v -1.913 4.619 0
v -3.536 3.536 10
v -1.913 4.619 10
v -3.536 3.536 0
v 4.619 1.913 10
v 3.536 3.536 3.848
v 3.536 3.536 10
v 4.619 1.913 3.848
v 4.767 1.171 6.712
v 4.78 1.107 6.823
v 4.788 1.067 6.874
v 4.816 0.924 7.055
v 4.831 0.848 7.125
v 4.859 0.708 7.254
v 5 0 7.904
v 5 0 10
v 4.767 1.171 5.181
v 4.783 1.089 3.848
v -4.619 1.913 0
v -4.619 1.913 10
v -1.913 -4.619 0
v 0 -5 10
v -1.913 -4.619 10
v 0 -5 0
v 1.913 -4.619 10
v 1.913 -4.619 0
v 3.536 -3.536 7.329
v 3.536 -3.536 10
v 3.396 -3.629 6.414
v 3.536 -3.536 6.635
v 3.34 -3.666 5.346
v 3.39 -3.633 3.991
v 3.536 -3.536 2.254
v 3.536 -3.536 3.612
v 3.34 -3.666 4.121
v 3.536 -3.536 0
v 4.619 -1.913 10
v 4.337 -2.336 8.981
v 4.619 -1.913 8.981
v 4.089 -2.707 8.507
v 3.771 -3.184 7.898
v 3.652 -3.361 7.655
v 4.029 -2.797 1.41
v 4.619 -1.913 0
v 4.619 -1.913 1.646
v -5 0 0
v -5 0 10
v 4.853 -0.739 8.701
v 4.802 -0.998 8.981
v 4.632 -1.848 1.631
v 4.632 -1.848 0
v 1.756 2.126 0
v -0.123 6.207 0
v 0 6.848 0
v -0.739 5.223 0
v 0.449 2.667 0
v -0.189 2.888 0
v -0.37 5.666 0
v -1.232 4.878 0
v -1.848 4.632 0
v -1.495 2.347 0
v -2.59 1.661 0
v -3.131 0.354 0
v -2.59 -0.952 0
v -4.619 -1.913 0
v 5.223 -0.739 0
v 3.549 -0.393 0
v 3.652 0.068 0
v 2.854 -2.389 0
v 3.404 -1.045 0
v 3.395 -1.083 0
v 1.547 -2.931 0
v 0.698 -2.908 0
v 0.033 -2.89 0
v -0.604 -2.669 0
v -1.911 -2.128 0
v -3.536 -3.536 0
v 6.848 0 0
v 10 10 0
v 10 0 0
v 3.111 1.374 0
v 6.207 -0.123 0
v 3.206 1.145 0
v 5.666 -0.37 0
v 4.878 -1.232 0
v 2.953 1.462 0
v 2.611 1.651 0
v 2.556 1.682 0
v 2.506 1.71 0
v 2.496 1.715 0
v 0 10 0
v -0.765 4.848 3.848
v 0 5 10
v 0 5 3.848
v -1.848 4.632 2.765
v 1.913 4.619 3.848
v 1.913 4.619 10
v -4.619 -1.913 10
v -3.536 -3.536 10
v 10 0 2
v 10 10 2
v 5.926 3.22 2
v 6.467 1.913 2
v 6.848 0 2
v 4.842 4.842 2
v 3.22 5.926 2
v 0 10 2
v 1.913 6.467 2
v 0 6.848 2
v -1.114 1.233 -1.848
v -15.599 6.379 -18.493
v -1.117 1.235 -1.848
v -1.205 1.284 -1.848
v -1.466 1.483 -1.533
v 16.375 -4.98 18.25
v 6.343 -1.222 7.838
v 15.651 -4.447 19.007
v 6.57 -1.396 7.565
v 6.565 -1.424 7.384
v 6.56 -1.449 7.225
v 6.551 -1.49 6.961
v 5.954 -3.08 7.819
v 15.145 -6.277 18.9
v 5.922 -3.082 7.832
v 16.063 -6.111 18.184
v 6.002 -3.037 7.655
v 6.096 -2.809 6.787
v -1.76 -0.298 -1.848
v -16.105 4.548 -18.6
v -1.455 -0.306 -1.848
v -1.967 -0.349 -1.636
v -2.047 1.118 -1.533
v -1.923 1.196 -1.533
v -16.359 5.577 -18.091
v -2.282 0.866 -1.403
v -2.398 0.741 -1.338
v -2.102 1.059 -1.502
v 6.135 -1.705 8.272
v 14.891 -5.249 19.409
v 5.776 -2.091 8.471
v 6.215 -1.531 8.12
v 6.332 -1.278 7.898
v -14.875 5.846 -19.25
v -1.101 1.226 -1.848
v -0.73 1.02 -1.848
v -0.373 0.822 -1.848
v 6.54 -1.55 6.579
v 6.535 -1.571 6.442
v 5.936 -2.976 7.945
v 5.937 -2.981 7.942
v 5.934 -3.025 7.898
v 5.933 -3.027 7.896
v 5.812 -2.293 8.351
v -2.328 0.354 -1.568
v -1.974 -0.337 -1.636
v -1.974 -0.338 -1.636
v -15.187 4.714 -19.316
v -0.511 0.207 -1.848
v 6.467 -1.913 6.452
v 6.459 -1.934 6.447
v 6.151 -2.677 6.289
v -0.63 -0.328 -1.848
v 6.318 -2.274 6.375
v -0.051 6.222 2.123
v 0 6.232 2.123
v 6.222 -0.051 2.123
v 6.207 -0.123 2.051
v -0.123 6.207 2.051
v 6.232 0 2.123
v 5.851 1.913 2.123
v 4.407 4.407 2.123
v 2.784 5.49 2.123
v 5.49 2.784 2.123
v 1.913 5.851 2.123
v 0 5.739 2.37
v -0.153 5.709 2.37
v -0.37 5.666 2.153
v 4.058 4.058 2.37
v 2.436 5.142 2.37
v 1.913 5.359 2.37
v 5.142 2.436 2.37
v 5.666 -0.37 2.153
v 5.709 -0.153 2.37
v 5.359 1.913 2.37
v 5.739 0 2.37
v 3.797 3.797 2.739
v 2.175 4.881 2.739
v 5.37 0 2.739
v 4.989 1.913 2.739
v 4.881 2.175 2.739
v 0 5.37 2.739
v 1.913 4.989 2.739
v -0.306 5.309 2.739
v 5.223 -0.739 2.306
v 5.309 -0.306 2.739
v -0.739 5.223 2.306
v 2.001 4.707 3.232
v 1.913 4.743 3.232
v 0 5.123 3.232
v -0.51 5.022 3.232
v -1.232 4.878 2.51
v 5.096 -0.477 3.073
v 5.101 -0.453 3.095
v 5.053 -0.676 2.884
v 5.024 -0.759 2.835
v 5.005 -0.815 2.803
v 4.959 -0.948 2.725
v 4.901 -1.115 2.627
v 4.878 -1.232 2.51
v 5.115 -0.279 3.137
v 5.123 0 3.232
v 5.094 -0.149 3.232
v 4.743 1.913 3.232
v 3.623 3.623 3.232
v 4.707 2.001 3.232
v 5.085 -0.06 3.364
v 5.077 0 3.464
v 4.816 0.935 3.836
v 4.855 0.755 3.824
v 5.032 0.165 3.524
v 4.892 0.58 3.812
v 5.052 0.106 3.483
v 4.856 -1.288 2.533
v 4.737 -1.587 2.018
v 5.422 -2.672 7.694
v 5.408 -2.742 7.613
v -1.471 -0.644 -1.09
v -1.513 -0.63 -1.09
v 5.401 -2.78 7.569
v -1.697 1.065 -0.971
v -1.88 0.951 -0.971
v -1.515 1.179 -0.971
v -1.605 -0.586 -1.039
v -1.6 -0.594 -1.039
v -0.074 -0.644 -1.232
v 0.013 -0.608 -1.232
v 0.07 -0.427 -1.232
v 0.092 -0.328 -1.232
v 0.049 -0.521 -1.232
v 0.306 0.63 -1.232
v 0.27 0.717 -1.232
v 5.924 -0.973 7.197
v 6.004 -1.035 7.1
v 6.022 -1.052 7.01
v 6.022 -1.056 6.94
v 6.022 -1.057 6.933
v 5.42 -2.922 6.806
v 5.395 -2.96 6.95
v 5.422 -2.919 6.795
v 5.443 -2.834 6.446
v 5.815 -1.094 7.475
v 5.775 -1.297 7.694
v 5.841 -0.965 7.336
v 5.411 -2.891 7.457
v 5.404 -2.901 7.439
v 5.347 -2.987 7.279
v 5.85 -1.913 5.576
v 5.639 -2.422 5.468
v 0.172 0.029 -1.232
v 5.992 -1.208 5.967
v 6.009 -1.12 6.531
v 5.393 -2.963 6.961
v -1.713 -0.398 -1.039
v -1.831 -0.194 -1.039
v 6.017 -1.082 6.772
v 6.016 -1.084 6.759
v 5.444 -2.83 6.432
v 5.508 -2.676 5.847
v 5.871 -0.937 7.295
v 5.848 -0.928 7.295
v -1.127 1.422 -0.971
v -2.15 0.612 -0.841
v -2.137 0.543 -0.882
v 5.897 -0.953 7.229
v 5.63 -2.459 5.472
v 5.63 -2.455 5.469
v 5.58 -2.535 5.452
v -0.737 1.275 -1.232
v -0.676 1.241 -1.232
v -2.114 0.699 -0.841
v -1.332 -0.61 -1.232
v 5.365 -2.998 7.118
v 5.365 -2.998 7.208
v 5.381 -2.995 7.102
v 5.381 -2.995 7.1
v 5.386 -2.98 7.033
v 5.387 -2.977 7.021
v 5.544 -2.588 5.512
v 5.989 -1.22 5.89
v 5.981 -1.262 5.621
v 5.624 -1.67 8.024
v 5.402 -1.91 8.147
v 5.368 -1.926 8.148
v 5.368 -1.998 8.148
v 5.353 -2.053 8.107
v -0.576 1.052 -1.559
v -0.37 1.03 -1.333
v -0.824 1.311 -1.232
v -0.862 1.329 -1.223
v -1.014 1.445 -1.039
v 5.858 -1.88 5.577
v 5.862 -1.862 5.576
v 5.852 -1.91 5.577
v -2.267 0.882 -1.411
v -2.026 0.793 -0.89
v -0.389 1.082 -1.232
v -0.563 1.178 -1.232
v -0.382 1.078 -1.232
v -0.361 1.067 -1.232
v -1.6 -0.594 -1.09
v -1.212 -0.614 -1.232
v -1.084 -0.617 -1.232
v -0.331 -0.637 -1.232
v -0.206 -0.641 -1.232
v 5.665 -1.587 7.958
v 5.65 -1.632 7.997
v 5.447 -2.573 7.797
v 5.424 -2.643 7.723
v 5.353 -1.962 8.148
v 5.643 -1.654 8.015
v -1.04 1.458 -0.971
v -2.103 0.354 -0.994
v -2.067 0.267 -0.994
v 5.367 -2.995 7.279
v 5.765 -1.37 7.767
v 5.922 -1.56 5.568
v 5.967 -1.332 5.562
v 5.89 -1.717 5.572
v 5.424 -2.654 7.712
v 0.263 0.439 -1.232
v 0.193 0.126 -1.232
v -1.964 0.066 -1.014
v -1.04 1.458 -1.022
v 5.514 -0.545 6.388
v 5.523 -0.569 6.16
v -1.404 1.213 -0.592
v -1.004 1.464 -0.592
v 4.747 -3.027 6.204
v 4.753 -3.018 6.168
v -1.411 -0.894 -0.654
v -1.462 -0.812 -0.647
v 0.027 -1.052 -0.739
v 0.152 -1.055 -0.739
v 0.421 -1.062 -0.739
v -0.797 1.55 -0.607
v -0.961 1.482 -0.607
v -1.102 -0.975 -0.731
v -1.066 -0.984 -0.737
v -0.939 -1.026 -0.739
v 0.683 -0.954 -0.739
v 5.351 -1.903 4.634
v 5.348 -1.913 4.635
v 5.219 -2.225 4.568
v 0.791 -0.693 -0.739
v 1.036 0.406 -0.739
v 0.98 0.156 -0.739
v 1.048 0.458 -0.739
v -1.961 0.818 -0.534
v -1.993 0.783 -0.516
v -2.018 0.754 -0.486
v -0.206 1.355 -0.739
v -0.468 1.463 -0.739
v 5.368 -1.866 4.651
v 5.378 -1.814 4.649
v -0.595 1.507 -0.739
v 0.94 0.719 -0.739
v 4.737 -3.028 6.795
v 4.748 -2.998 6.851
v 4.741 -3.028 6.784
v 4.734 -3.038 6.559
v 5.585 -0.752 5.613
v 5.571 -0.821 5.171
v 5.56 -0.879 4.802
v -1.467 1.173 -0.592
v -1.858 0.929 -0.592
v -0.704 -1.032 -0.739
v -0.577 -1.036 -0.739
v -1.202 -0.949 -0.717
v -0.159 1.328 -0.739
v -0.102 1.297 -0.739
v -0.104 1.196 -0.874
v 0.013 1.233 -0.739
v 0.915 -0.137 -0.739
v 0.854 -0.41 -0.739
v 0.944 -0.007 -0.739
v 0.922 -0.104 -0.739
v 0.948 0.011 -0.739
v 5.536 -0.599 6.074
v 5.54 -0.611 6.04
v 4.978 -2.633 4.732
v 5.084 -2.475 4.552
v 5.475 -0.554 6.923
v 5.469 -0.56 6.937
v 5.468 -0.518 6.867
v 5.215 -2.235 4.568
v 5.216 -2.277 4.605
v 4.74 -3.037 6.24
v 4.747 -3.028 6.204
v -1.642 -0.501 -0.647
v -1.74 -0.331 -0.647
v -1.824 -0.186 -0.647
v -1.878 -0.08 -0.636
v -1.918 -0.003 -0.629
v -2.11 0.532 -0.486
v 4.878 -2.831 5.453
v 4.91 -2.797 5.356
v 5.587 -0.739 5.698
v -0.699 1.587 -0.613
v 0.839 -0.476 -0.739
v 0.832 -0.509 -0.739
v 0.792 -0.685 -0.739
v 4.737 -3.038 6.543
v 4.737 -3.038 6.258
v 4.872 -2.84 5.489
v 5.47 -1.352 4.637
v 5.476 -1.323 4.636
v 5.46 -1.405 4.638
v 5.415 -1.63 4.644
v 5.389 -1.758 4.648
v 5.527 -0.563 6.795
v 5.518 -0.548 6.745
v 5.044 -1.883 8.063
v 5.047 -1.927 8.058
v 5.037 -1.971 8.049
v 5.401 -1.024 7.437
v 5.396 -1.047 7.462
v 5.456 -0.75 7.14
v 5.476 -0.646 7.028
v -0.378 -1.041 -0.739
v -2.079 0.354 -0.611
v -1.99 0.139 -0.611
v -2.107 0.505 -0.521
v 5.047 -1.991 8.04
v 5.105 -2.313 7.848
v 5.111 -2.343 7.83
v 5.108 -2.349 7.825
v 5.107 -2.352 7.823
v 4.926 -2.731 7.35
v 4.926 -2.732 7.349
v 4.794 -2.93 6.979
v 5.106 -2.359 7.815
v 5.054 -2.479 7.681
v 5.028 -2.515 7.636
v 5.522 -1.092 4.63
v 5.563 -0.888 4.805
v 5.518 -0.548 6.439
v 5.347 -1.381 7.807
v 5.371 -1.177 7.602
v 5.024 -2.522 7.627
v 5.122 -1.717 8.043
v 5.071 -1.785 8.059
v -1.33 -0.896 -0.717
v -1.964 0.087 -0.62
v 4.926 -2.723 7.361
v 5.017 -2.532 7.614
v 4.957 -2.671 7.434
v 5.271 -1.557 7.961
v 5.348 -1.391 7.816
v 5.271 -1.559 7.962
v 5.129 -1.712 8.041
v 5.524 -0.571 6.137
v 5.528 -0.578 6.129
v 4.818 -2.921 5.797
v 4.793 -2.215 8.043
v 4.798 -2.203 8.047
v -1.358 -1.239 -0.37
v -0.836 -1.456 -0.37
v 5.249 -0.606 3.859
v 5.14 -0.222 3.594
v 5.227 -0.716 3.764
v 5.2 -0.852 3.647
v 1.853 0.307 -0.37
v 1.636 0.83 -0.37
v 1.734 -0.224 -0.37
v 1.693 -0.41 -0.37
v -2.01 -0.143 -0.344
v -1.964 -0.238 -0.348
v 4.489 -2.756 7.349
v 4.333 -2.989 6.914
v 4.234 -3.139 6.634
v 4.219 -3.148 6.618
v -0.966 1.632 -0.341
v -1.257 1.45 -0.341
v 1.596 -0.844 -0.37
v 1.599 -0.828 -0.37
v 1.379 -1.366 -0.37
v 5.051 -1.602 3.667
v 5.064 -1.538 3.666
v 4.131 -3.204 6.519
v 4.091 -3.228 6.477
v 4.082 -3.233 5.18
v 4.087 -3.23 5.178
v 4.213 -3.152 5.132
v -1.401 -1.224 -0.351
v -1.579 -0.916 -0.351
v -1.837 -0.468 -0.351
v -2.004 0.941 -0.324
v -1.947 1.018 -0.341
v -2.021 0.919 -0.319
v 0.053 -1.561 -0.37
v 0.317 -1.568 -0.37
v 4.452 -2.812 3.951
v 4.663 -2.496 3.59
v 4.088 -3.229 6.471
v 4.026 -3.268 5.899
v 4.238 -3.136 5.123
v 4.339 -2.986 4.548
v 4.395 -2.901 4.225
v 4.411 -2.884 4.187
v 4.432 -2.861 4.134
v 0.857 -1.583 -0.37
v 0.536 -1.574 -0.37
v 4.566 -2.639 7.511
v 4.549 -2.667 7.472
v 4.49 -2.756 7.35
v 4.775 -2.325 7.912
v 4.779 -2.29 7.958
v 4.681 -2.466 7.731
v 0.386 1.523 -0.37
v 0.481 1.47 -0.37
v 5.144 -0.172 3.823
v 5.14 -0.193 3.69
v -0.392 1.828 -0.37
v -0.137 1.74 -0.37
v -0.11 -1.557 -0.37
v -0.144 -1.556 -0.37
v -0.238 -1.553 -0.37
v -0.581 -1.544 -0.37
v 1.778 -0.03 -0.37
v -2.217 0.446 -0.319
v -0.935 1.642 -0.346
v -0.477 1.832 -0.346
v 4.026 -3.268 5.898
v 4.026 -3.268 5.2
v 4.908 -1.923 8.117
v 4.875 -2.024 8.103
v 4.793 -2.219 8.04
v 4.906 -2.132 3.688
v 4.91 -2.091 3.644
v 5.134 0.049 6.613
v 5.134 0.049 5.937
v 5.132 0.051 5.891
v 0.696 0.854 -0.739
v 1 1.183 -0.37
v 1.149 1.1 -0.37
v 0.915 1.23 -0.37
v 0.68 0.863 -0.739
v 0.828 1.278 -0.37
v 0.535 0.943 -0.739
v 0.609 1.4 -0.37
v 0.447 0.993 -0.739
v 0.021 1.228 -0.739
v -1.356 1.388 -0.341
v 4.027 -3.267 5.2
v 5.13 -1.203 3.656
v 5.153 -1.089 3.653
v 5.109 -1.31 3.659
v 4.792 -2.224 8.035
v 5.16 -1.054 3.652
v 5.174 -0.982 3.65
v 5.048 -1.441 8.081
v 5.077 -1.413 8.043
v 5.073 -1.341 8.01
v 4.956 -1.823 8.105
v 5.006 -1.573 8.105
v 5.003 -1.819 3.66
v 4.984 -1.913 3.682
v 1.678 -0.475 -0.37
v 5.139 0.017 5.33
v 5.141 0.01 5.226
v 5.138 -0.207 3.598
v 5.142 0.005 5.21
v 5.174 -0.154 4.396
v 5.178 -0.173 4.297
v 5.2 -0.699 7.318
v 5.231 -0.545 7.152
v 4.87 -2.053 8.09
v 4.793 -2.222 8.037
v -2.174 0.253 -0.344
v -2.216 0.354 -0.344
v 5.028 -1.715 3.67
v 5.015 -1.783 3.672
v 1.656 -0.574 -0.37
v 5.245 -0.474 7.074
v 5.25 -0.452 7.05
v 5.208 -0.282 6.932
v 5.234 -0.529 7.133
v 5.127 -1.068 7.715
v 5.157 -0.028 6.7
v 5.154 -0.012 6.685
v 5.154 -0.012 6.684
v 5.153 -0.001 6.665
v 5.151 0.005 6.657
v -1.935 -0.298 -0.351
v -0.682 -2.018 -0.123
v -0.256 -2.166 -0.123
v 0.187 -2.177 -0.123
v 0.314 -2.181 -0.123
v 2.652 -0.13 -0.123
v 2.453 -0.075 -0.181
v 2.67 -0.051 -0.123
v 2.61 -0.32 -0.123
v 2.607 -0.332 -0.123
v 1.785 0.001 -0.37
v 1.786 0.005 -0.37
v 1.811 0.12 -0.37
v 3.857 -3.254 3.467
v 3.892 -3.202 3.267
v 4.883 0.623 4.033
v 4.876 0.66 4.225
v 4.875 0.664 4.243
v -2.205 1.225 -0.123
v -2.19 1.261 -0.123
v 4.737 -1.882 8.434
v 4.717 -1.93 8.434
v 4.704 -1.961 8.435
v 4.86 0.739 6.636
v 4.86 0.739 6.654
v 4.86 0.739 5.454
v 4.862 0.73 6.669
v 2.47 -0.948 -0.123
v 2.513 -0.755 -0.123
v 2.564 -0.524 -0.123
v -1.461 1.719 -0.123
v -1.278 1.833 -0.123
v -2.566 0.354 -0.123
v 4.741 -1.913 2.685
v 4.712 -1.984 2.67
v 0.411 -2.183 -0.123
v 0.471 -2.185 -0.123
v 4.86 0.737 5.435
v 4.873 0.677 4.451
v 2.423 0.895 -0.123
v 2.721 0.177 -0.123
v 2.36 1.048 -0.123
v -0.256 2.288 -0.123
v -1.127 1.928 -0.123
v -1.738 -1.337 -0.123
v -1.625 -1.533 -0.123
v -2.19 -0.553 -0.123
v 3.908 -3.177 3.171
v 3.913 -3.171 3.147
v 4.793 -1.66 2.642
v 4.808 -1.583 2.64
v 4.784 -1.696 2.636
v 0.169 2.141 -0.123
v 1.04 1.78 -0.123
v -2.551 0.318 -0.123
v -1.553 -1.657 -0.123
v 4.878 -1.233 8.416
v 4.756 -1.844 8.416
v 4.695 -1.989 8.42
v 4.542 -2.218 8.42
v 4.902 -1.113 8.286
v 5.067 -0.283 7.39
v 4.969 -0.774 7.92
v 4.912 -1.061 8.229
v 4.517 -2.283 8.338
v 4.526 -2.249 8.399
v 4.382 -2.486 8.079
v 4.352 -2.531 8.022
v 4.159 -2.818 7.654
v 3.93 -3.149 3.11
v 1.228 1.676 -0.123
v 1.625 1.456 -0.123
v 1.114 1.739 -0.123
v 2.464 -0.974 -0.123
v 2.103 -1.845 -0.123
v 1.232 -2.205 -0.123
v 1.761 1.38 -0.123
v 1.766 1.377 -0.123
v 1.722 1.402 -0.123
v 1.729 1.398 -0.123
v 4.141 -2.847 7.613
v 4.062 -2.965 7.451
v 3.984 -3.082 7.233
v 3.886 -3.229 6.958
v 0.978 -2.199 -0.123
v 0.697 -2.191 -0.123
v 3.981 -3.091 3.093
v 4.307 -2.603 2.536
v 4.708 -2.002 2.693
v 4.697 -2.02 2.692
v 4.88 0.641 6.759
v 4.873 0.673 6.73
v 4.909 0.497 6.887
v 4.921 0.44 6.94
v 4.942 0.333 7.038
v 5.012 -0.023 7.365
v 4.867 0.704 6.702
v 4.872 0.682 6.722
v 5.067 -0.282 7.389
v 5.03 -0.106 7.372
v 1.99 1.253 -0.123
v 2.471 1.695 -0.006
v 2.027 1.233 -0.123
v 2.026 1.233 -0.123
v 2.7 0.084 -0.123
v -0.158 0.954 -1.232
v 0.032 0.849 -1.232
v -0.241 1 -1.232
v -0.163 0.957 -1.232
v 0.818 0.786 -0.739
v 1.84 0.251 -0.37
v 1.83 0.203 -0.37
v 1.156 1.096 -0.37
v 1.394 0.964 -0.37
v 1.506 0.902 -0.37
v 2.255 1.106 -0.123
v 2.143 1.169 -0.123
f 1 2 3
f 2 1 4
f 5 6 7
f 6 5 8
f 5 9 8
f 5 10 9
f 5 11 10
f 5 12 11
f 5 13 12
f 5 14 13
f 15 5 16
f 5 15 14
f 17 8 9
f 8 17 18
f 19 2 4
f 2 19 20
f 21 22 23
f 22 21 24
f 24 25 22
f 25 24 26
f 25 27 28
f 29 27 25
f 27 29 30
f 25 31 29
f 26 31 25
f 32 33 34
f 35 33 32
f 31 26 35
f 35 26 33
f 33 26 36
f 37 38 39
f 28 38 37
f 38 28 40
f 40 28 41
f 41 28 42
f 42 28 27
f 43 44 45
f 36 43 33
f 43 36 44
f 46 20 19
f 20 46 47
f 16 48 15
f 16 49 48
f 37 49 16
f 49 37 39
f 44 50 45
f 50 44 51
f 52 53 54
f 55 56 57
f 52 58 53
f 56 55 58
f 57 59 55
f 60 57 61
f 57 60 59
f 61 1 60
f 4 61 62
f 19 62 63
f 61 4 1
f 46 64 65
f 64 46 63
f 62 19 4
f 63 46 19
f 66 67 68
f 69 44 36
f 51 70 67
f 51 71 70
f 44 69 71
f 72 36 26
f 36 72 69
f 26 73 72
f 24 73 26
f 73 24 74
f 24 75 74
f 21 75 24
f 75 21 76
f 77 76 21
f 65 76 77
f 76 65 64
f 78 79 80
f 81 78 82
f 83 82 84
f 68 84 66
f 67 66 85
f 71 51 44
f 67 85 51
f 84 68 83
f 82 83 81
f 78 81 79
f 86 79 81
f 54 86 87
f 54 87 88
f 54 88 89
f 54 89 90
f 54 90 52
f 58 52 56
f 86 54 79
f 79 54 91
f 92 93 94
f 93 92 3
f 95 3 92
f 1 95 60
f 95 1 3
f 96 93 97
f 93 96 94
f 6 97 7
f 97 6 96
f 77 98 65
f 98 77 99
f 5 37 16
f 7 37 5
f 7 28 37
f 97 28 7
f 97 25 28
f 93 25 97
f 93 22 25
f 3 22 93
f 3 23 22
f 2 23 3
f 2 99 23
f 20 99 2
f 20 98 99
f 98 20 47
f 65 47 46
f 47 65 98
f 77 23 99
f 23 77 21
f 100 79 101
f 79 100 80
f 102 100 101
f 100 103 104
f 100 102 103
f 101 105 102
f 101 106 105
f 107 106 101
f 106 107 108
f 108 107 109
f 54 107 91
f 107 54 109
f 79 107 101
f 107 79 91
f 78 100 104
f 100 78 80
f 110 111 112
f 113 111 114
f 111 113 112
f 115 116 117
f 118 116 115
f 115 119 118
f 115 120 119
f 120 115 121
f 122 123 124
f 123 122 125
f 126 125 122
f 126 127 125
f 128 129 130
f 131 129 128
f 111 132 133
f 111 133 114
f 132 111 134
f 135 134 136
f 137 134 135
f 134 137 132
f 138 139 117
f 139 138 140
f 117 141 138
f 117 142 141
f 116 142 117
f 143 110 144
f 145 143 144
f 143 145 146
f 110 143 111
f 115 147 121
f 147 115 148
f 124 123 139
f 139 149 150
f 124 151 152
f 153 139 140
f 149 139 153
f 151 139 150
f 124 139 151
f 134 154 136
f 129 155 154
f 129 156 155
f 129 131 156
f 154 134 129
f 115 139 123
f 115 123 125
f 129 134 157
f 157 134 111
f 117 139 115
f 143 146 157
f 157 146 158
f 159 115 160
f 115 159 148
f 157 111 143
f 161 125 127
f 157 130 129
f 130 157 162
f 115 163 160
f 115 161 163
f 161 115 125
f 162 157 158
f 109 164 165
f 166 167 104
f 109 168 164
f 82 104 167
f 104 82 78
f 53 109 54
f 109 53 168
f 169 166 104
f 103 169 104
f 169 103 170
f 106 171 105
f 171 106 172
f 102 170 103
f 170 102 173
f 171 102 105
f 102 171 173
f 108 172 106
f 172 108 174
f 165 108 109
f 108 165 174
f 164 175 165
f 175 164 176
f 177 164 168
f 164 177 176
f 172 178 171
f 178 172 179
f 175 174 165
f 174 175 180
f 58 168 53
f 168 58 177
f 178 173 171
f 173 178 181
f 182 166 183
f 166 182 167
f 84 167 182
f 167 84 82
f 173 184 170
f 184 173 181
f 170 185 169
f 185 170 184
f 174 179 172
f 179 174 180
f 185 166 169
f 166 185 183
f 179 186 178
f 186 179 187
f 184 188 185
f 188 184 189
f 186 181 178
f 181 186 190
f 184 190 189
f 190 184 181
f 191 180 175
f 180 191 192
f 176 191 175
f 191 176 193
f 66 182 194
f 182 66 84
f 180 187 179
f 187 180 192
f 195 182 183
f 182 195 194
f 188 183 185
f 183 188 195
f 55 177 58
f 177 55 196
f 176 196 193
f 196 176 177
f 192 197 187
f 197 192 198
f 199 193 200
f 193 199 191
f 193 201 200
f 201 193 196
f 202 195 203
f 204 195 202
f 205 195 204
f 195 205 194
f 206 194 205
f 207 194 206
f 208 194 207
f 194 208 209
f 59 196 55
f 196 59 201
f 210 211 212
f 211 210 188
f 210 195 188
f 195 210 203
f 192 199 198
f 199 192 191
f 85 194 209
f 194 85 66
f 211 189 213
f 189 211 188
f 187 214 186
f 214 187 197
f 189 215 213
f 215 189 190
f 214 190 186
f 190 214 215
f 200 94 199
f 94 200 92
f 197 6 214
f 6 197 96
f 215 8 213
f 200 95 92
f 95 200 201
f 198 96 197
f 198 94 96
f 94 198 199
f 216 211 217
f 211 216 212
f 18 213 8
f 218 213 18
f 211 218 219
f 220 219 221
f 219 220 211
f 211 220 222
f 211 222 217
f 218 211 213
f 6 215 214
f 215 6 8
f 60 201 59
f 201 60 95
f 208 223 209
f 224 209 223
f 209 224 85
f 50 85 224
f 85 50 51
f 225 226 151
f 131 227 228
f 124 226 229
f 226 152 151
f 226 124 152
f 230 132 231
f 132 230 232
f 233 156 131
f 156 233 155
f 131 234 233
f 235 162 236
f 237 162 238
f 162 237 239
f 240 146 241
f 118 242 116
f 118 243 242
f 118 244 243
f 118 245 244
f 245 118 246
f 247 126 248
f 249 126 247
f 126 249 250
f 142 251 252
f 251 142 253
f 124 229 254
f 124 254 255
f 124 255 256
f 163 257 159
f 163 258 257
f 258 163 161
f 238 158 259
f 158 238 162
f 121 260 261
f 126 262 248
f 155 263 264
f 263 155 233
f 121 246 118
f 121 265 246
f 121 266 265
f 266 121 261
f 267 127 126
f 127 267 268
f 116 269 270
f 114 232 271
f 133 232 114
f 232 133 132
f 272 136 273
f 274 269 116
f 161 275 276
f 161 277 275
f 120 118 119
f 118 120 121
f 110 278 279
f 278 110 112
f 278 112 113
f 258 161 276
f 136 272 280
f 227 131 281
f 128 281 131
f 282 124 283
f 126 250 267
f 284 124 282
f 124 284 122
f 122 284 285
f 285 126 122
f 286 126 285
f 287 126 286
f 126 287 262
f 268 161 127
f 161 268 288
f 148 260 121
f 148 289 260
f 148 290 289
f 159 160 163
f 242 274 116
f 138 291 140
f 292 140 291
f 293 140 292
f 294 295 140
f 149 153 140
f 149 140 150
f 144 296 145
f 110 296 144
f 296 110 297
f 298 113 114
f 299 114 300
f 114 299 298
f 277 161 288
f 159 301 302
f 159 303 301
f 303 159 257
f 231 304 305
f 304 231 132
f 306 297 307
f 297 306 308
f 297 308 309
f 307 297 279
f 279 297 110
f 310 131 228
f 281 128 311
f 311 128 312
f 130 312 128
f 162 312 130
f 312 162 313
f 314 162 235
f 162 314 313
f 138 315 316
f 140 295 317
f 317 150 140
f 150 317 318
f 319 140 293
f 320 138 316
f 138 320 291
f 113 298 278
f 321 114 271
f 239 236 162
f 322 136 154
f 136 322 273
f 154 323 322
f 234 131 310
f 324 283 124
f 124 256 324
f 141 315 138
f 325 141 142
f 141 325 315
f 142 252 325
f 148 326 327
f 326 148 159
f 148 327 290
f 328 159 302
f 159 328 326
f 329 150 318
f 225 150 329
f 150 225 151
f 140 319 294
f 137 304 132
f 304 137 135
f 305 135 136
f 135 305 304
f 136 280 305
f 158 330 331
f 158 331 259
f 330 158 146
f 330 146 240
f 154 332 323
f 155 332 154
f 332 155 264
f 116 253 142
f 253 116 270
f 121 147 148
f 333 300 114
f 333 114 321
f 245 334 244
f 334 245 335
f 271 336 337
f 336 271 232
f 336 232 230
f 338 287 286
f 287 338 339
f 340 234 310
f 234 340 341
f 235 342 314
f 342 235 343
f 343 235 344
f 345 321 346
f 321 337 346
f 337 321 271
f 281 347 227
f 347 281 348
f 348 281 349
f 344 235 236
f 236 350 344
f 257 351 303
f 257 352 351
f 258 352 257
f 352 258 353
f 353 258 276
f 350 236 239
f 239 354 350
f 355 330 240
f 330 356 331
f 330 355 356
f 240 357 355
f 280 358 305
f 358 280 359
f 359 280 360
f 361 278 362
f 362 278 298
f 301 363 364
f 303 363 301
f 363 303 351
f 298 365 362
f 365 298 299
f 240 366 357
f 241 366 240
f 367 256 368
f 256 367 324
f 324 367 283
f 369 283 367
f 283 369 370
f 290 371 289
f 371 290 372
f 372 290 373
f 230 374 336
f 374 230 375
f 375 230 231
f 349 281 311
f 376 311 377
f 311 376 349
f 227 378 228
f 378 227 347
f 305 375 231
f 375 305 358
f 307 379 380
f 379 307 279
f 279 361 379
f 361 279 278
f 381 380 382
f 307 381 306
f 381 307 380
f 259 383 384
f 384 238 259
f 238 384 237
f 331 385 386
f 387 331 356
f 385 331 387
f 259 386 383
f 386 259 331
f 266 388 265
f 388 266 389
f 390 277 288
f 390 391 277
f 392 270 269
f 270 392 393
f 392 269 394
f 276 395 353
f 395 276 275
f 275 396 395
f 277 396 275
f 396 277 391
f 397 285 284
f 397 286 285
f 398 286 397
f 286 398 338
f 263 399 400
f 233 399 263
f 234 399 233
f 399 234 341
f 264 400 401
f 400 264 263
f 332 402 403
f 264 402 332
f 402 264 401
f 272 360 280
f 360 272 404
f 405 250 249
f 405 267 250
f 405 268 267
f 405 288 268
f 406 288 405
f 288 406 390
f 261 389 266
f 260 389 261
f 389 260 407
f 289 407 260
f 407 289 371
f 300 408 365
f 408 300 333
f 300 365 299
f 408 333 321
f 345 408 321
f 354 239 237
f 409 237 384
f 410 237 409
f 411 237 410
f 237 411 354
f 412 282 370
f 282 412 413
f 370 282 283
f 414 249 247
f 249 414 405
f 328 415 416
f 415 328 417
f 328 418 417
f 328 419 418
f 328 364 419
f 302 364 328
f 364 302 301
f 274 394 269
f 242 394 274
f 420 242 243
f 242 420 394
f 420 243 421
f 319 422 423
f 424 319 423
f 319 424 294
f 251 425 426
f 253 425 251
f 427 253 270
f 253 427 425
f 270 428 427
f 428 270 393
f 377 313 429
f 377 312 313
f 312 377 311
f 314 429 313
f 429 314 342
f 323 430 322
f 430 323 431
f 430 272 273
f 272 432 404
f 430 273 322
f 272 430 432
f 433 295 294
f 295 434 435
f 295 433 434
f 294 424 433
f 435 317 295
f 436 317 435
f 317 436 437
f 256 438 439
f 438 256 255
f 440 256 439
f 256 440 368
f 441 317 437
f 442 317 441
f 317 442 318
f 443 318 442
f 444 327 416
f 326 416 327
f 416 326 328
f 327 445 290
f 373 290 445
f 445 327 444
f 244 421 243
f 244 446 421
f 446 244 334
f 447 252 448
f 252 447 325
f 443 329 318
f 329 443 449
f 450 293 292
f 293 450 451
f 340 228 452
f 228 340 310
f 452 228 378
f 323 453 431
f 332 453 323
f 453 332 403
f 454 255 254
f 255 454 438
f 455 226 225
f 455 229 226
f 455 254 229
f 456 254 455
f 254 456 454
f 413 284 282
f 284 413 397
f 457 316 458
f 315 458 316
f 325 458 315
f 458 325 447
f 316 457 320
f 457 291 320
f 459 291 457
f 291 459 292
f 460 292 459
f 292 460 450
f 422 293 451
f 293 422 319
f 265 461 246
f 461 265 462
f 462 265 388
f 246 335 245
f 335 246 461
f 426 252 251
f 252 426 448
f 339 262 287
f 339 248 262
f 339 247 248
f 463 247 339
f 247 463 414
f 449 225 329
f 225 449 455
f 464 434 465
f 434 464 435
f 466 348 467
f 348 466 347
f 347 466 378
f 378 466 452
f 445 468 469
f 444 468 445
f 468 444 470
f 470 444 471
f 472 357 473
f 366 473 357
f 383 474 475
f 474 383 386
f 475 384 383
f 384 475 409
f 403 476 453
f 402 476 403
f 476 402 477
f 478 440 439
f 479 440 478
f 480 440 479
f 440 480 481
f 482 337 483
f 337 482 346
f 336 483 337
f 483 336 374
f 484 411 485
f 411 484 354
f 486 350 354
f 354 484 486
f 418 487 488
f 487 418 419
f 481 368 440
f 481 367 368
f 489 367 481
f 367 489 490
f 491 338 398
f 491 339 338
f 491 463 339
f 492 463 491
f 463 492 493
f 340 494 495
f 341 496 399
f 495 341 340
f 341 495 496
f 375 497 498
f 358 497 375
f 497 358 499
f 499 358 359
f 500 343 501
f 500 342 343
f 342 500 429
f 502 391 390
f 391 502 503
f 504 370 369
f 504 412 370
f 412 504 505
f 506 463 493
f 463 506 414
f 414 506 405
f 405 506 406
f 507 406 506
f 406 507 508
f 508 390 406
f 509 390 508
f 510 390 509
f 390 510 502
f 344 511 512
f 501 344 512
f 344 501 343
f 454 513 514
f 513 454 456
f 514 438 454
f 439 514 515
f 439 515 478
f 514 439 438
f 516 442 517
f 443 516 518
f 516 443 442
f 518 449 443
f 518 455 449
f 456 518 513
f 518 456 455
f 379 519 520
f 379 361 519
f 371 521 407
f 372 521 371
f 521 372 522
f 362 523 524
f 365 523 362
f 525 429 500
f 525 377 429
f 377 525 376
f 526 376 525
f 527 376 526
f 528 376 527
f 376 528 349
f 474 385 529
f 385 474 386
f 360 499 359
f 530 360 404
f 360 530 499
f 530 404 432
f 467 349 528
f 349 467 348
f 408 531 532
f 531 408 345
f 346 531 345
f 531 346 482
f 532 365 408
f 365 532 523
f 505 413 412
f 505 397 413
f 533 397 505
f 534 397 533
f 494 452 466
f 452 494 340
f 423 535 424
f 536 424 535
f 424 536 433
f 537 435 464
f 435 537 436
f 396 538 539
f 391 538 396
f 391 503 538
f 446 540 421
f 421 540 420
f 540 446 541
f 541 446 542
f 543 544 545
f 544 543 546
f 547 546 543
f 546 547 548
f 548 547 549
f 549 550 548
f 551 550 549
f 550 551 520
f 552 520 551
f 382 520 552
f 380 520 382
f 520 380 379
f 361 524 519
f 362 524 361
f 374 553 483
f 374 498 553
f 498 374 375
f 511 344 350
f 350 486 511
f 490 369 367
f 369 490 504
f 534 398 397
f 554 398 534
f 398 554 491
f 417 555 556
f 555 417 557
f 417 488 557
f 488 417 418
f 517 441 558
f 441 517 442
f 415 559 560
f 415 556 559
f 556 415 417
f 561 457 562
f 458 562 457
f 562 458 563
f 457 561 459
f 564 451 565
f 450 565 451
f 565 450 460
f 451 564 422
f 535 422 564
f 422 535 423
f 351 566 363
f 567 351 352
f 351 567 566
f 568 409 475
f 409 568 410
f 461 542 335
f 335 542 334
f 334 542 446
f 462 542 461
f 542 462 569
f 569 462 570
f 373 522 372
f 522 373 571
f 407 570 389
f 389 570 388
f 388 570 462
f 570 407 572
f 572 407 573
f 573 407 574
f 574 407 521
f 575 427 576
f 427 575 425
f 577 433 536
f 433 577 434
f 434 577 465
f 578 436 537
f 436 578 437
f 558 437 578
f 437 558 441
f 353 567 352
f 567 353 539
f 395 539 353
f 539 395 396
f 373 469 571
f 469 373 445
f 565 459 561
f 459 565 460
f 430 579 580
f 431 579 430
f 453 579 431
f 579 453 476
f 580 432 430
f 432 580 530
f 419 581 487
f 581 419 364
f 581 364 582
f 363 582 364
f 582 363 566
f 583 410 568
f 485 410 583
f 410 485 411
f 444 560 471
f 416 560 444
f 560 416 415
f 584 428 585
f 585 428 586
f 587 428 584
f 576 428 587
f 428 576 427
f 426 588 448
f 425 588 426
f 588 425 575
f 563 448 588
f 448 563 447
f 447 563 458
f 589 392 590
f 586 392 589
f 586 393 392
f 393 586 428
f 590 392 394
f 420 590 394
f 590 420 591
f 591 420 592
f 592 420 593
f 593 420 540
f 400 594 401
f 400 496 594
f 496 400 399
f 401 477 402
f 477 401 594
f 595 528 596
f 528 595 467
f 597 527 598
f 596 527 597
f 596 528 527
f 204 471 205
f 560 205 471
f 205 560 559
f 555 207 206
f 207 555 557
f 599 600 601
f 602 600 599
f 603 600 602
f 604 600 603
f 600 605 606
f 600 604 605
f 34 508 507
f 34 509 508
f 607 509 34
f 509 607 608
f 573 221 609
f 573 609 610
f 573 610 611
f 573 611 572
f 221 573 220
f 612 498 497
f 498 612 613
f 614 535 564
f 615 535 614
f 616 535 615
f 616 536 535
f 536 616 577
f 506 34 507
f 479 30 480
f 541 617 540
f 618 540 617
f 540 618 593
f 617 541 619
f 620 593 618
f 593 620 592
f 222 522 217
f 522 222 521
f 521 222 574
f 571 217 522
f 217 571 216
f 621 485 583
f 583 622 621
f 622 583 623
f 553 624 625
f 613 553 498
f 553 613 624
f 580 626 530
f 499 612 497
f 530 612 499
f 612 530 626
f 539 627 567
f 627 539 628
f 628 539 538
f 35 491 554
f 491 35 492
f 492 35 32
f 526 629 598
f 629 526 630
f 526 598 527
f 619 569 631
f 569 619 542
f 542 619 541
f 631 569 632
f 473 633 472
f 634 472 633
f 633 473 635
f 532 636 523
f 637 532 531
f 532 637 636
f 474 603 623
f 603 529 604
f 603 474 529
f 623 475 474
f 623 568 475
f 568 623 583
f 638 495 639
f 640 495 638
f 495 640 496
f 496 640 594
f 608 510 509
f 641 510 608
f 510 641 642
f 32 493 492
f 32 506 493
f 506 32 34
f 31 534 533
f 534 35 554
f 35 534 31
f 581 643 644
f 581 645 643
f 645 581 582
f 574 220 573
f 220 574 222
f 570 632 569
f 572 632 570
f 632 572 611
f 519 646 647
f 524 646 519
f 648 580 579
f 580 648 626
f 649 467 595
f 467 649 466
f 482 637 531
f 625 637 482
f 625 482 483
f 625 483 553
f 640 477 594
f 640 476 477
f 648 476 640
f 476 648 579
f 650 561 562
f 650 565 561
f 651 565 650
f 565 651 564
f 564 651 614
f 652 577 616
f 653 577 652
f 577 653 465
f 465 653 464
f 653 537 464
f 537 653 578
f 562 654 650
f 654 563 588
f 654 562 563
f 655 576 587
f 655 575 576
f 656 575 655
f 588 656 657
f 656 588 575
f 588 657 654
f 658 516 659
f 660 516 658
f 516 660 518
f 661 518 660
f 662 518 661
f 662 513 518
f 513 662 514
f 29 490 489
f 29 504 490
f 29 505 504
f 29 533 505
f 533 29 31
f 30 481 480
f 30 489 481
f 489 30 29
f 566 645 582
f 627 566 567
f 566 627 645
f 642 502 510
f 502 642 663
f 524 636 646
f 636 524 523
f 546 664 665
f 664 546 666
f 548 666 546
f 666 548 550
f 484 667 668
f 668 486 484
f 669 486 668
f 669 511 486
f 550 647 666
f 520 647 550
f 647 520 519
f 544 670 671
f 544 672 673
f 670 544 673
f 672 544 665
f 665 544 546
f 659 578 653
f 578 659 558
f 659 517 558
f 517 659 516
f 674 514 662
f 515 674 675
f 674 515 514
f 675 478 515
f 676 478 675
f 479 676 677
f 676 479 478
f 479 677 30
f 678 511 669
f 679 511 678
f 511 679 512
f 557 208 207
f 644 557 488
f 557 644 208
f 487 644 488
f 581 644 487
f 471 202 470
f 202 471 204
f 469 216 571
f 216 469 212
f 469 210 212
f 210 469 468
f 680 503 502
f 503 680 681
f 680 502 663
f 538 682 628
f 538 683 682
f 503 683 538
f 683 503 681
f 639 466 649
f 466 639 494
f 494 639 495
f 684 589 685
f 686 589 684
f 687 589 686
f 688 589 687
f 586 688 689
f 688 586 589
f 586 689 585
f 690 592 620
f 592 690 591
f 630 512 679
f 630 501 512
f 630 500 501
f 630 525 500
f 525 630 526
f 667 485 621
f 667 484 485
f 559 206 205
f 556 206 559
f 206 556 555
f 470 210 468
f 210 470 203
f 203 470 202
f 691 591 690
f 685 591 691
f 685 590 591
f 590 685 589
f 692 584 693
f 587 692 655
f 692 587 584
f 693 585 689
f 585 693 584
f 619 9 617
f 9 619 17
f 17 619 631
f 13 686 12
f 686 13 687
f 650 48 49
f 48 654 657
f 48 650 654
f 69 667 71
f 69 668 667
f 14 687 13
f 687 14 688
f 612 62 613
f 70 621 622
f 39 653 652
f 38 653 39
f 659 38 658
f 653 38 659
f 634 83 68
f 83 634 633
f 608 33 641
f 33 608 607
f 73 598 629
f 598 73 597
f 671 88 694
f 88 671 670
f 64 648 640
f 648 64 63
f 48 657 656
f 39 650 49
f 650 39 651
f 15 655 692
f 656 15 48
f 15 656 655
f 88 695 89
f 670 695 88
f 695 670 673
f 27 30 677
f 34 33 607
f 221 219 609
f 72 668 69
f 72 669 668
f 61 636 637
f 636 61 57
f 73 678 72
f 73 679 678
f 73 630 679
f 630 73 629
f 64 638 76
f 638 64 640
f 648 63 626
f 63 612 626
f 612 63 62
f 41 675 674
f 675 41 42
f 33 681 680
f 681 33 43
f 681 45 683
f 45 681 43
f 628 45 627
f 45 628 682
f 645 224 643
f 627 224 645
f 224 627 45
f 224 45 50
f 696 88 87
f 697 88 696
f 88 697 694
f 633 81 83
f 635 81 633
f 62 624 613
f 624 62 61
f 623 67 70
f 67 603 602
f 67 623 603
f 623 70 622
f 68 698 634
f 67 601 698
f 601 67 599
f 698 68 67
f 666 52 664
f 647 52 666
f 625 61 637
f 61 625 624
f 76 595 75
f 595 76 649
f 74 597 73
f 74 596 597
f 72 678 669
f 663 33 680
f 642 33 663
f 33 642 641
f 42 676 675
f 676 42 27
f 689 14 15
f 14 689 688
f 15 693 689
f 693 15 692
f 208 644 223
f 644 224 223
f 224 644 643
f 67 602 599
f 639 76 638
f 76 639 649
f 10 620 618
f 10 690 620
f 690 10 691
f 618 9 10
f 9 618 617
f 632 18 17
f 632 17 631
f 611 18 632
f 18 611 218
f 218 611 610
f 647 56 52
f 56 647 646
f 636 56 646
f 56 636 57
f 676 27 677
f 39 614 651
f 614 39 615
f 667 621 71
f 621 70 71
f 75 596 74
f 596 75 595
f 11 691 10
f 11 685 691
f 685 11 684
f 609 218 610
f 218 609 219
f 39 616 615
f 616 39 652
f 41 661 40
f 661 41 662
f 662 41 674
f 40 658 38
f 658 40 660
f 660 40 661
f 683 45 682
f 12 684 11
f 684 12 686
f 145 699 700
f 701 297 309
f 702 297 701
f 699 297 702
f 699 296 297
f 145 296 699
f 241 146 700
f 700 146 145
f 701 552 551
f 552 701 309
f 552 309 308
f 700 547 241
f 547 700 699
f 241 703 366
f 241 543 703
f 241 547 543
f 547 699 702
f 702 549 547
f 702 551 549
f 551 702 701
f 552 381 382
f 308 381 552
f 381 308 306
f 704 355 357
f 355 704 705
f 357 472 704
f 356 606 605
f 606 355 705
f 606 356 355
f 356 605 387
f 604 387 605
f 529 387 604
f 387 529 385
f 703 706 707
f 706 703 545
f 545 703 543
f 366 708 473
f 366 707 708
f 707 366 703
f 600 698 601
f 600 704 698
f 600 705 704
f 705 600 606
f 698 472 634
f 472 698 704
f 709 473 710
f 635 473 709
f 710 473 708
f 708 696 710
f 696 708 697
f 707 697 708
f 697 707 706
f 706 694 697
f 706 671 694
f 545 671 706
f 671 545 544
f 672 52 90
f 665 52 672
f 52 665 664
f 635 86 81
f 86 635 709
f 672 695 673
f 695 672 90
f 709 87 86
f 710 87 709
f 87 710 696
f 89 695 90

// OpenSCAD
// Fillet function
// https://github.com/clothbot/ClothBotCreations/tree/master/utilities

module fillet(r=1.0,steps=3,include=true, skip=false) {
    if (skip) children();
    else {
	if(include) for (k=[0:$children-1]) {
	    children(k);
	}

	for (i=[0:$children-2] ) {
	    for(j=[i+1:$children-1] ) {
		fillet_two(r=r,steps=steps) {
		    children(i);
		    children(j);
		    intersection() {
			children(i);
			children(j);
		    }
		}
	    }
	}
    }
}

module fillet_two(r=1.0,steps=3) {
  for(step=[1:steps]) {
	hull() {
	  render() intersection() {
		children(0);
		offset_3d(r=r*step/steps) children(2);
	  }
	  render() intersection() {
		children(1);
		offset_3d(r=r*(steps-step+1)/steps) children(2);
	  }
	}
  }
}

module offset_3d(r=1.0) {
  for(k=[0:$children-1]) minkowski() {
	children(k);
	sphere(r=r,$fn=8);
  }
}

fillet(r=2,steps=5) {
	cylinder(r=5,h=10);
	cube([10,10,2]);
	rotate([30,30,30]) cylinder(r=1.0,h=50,center=true);
}
